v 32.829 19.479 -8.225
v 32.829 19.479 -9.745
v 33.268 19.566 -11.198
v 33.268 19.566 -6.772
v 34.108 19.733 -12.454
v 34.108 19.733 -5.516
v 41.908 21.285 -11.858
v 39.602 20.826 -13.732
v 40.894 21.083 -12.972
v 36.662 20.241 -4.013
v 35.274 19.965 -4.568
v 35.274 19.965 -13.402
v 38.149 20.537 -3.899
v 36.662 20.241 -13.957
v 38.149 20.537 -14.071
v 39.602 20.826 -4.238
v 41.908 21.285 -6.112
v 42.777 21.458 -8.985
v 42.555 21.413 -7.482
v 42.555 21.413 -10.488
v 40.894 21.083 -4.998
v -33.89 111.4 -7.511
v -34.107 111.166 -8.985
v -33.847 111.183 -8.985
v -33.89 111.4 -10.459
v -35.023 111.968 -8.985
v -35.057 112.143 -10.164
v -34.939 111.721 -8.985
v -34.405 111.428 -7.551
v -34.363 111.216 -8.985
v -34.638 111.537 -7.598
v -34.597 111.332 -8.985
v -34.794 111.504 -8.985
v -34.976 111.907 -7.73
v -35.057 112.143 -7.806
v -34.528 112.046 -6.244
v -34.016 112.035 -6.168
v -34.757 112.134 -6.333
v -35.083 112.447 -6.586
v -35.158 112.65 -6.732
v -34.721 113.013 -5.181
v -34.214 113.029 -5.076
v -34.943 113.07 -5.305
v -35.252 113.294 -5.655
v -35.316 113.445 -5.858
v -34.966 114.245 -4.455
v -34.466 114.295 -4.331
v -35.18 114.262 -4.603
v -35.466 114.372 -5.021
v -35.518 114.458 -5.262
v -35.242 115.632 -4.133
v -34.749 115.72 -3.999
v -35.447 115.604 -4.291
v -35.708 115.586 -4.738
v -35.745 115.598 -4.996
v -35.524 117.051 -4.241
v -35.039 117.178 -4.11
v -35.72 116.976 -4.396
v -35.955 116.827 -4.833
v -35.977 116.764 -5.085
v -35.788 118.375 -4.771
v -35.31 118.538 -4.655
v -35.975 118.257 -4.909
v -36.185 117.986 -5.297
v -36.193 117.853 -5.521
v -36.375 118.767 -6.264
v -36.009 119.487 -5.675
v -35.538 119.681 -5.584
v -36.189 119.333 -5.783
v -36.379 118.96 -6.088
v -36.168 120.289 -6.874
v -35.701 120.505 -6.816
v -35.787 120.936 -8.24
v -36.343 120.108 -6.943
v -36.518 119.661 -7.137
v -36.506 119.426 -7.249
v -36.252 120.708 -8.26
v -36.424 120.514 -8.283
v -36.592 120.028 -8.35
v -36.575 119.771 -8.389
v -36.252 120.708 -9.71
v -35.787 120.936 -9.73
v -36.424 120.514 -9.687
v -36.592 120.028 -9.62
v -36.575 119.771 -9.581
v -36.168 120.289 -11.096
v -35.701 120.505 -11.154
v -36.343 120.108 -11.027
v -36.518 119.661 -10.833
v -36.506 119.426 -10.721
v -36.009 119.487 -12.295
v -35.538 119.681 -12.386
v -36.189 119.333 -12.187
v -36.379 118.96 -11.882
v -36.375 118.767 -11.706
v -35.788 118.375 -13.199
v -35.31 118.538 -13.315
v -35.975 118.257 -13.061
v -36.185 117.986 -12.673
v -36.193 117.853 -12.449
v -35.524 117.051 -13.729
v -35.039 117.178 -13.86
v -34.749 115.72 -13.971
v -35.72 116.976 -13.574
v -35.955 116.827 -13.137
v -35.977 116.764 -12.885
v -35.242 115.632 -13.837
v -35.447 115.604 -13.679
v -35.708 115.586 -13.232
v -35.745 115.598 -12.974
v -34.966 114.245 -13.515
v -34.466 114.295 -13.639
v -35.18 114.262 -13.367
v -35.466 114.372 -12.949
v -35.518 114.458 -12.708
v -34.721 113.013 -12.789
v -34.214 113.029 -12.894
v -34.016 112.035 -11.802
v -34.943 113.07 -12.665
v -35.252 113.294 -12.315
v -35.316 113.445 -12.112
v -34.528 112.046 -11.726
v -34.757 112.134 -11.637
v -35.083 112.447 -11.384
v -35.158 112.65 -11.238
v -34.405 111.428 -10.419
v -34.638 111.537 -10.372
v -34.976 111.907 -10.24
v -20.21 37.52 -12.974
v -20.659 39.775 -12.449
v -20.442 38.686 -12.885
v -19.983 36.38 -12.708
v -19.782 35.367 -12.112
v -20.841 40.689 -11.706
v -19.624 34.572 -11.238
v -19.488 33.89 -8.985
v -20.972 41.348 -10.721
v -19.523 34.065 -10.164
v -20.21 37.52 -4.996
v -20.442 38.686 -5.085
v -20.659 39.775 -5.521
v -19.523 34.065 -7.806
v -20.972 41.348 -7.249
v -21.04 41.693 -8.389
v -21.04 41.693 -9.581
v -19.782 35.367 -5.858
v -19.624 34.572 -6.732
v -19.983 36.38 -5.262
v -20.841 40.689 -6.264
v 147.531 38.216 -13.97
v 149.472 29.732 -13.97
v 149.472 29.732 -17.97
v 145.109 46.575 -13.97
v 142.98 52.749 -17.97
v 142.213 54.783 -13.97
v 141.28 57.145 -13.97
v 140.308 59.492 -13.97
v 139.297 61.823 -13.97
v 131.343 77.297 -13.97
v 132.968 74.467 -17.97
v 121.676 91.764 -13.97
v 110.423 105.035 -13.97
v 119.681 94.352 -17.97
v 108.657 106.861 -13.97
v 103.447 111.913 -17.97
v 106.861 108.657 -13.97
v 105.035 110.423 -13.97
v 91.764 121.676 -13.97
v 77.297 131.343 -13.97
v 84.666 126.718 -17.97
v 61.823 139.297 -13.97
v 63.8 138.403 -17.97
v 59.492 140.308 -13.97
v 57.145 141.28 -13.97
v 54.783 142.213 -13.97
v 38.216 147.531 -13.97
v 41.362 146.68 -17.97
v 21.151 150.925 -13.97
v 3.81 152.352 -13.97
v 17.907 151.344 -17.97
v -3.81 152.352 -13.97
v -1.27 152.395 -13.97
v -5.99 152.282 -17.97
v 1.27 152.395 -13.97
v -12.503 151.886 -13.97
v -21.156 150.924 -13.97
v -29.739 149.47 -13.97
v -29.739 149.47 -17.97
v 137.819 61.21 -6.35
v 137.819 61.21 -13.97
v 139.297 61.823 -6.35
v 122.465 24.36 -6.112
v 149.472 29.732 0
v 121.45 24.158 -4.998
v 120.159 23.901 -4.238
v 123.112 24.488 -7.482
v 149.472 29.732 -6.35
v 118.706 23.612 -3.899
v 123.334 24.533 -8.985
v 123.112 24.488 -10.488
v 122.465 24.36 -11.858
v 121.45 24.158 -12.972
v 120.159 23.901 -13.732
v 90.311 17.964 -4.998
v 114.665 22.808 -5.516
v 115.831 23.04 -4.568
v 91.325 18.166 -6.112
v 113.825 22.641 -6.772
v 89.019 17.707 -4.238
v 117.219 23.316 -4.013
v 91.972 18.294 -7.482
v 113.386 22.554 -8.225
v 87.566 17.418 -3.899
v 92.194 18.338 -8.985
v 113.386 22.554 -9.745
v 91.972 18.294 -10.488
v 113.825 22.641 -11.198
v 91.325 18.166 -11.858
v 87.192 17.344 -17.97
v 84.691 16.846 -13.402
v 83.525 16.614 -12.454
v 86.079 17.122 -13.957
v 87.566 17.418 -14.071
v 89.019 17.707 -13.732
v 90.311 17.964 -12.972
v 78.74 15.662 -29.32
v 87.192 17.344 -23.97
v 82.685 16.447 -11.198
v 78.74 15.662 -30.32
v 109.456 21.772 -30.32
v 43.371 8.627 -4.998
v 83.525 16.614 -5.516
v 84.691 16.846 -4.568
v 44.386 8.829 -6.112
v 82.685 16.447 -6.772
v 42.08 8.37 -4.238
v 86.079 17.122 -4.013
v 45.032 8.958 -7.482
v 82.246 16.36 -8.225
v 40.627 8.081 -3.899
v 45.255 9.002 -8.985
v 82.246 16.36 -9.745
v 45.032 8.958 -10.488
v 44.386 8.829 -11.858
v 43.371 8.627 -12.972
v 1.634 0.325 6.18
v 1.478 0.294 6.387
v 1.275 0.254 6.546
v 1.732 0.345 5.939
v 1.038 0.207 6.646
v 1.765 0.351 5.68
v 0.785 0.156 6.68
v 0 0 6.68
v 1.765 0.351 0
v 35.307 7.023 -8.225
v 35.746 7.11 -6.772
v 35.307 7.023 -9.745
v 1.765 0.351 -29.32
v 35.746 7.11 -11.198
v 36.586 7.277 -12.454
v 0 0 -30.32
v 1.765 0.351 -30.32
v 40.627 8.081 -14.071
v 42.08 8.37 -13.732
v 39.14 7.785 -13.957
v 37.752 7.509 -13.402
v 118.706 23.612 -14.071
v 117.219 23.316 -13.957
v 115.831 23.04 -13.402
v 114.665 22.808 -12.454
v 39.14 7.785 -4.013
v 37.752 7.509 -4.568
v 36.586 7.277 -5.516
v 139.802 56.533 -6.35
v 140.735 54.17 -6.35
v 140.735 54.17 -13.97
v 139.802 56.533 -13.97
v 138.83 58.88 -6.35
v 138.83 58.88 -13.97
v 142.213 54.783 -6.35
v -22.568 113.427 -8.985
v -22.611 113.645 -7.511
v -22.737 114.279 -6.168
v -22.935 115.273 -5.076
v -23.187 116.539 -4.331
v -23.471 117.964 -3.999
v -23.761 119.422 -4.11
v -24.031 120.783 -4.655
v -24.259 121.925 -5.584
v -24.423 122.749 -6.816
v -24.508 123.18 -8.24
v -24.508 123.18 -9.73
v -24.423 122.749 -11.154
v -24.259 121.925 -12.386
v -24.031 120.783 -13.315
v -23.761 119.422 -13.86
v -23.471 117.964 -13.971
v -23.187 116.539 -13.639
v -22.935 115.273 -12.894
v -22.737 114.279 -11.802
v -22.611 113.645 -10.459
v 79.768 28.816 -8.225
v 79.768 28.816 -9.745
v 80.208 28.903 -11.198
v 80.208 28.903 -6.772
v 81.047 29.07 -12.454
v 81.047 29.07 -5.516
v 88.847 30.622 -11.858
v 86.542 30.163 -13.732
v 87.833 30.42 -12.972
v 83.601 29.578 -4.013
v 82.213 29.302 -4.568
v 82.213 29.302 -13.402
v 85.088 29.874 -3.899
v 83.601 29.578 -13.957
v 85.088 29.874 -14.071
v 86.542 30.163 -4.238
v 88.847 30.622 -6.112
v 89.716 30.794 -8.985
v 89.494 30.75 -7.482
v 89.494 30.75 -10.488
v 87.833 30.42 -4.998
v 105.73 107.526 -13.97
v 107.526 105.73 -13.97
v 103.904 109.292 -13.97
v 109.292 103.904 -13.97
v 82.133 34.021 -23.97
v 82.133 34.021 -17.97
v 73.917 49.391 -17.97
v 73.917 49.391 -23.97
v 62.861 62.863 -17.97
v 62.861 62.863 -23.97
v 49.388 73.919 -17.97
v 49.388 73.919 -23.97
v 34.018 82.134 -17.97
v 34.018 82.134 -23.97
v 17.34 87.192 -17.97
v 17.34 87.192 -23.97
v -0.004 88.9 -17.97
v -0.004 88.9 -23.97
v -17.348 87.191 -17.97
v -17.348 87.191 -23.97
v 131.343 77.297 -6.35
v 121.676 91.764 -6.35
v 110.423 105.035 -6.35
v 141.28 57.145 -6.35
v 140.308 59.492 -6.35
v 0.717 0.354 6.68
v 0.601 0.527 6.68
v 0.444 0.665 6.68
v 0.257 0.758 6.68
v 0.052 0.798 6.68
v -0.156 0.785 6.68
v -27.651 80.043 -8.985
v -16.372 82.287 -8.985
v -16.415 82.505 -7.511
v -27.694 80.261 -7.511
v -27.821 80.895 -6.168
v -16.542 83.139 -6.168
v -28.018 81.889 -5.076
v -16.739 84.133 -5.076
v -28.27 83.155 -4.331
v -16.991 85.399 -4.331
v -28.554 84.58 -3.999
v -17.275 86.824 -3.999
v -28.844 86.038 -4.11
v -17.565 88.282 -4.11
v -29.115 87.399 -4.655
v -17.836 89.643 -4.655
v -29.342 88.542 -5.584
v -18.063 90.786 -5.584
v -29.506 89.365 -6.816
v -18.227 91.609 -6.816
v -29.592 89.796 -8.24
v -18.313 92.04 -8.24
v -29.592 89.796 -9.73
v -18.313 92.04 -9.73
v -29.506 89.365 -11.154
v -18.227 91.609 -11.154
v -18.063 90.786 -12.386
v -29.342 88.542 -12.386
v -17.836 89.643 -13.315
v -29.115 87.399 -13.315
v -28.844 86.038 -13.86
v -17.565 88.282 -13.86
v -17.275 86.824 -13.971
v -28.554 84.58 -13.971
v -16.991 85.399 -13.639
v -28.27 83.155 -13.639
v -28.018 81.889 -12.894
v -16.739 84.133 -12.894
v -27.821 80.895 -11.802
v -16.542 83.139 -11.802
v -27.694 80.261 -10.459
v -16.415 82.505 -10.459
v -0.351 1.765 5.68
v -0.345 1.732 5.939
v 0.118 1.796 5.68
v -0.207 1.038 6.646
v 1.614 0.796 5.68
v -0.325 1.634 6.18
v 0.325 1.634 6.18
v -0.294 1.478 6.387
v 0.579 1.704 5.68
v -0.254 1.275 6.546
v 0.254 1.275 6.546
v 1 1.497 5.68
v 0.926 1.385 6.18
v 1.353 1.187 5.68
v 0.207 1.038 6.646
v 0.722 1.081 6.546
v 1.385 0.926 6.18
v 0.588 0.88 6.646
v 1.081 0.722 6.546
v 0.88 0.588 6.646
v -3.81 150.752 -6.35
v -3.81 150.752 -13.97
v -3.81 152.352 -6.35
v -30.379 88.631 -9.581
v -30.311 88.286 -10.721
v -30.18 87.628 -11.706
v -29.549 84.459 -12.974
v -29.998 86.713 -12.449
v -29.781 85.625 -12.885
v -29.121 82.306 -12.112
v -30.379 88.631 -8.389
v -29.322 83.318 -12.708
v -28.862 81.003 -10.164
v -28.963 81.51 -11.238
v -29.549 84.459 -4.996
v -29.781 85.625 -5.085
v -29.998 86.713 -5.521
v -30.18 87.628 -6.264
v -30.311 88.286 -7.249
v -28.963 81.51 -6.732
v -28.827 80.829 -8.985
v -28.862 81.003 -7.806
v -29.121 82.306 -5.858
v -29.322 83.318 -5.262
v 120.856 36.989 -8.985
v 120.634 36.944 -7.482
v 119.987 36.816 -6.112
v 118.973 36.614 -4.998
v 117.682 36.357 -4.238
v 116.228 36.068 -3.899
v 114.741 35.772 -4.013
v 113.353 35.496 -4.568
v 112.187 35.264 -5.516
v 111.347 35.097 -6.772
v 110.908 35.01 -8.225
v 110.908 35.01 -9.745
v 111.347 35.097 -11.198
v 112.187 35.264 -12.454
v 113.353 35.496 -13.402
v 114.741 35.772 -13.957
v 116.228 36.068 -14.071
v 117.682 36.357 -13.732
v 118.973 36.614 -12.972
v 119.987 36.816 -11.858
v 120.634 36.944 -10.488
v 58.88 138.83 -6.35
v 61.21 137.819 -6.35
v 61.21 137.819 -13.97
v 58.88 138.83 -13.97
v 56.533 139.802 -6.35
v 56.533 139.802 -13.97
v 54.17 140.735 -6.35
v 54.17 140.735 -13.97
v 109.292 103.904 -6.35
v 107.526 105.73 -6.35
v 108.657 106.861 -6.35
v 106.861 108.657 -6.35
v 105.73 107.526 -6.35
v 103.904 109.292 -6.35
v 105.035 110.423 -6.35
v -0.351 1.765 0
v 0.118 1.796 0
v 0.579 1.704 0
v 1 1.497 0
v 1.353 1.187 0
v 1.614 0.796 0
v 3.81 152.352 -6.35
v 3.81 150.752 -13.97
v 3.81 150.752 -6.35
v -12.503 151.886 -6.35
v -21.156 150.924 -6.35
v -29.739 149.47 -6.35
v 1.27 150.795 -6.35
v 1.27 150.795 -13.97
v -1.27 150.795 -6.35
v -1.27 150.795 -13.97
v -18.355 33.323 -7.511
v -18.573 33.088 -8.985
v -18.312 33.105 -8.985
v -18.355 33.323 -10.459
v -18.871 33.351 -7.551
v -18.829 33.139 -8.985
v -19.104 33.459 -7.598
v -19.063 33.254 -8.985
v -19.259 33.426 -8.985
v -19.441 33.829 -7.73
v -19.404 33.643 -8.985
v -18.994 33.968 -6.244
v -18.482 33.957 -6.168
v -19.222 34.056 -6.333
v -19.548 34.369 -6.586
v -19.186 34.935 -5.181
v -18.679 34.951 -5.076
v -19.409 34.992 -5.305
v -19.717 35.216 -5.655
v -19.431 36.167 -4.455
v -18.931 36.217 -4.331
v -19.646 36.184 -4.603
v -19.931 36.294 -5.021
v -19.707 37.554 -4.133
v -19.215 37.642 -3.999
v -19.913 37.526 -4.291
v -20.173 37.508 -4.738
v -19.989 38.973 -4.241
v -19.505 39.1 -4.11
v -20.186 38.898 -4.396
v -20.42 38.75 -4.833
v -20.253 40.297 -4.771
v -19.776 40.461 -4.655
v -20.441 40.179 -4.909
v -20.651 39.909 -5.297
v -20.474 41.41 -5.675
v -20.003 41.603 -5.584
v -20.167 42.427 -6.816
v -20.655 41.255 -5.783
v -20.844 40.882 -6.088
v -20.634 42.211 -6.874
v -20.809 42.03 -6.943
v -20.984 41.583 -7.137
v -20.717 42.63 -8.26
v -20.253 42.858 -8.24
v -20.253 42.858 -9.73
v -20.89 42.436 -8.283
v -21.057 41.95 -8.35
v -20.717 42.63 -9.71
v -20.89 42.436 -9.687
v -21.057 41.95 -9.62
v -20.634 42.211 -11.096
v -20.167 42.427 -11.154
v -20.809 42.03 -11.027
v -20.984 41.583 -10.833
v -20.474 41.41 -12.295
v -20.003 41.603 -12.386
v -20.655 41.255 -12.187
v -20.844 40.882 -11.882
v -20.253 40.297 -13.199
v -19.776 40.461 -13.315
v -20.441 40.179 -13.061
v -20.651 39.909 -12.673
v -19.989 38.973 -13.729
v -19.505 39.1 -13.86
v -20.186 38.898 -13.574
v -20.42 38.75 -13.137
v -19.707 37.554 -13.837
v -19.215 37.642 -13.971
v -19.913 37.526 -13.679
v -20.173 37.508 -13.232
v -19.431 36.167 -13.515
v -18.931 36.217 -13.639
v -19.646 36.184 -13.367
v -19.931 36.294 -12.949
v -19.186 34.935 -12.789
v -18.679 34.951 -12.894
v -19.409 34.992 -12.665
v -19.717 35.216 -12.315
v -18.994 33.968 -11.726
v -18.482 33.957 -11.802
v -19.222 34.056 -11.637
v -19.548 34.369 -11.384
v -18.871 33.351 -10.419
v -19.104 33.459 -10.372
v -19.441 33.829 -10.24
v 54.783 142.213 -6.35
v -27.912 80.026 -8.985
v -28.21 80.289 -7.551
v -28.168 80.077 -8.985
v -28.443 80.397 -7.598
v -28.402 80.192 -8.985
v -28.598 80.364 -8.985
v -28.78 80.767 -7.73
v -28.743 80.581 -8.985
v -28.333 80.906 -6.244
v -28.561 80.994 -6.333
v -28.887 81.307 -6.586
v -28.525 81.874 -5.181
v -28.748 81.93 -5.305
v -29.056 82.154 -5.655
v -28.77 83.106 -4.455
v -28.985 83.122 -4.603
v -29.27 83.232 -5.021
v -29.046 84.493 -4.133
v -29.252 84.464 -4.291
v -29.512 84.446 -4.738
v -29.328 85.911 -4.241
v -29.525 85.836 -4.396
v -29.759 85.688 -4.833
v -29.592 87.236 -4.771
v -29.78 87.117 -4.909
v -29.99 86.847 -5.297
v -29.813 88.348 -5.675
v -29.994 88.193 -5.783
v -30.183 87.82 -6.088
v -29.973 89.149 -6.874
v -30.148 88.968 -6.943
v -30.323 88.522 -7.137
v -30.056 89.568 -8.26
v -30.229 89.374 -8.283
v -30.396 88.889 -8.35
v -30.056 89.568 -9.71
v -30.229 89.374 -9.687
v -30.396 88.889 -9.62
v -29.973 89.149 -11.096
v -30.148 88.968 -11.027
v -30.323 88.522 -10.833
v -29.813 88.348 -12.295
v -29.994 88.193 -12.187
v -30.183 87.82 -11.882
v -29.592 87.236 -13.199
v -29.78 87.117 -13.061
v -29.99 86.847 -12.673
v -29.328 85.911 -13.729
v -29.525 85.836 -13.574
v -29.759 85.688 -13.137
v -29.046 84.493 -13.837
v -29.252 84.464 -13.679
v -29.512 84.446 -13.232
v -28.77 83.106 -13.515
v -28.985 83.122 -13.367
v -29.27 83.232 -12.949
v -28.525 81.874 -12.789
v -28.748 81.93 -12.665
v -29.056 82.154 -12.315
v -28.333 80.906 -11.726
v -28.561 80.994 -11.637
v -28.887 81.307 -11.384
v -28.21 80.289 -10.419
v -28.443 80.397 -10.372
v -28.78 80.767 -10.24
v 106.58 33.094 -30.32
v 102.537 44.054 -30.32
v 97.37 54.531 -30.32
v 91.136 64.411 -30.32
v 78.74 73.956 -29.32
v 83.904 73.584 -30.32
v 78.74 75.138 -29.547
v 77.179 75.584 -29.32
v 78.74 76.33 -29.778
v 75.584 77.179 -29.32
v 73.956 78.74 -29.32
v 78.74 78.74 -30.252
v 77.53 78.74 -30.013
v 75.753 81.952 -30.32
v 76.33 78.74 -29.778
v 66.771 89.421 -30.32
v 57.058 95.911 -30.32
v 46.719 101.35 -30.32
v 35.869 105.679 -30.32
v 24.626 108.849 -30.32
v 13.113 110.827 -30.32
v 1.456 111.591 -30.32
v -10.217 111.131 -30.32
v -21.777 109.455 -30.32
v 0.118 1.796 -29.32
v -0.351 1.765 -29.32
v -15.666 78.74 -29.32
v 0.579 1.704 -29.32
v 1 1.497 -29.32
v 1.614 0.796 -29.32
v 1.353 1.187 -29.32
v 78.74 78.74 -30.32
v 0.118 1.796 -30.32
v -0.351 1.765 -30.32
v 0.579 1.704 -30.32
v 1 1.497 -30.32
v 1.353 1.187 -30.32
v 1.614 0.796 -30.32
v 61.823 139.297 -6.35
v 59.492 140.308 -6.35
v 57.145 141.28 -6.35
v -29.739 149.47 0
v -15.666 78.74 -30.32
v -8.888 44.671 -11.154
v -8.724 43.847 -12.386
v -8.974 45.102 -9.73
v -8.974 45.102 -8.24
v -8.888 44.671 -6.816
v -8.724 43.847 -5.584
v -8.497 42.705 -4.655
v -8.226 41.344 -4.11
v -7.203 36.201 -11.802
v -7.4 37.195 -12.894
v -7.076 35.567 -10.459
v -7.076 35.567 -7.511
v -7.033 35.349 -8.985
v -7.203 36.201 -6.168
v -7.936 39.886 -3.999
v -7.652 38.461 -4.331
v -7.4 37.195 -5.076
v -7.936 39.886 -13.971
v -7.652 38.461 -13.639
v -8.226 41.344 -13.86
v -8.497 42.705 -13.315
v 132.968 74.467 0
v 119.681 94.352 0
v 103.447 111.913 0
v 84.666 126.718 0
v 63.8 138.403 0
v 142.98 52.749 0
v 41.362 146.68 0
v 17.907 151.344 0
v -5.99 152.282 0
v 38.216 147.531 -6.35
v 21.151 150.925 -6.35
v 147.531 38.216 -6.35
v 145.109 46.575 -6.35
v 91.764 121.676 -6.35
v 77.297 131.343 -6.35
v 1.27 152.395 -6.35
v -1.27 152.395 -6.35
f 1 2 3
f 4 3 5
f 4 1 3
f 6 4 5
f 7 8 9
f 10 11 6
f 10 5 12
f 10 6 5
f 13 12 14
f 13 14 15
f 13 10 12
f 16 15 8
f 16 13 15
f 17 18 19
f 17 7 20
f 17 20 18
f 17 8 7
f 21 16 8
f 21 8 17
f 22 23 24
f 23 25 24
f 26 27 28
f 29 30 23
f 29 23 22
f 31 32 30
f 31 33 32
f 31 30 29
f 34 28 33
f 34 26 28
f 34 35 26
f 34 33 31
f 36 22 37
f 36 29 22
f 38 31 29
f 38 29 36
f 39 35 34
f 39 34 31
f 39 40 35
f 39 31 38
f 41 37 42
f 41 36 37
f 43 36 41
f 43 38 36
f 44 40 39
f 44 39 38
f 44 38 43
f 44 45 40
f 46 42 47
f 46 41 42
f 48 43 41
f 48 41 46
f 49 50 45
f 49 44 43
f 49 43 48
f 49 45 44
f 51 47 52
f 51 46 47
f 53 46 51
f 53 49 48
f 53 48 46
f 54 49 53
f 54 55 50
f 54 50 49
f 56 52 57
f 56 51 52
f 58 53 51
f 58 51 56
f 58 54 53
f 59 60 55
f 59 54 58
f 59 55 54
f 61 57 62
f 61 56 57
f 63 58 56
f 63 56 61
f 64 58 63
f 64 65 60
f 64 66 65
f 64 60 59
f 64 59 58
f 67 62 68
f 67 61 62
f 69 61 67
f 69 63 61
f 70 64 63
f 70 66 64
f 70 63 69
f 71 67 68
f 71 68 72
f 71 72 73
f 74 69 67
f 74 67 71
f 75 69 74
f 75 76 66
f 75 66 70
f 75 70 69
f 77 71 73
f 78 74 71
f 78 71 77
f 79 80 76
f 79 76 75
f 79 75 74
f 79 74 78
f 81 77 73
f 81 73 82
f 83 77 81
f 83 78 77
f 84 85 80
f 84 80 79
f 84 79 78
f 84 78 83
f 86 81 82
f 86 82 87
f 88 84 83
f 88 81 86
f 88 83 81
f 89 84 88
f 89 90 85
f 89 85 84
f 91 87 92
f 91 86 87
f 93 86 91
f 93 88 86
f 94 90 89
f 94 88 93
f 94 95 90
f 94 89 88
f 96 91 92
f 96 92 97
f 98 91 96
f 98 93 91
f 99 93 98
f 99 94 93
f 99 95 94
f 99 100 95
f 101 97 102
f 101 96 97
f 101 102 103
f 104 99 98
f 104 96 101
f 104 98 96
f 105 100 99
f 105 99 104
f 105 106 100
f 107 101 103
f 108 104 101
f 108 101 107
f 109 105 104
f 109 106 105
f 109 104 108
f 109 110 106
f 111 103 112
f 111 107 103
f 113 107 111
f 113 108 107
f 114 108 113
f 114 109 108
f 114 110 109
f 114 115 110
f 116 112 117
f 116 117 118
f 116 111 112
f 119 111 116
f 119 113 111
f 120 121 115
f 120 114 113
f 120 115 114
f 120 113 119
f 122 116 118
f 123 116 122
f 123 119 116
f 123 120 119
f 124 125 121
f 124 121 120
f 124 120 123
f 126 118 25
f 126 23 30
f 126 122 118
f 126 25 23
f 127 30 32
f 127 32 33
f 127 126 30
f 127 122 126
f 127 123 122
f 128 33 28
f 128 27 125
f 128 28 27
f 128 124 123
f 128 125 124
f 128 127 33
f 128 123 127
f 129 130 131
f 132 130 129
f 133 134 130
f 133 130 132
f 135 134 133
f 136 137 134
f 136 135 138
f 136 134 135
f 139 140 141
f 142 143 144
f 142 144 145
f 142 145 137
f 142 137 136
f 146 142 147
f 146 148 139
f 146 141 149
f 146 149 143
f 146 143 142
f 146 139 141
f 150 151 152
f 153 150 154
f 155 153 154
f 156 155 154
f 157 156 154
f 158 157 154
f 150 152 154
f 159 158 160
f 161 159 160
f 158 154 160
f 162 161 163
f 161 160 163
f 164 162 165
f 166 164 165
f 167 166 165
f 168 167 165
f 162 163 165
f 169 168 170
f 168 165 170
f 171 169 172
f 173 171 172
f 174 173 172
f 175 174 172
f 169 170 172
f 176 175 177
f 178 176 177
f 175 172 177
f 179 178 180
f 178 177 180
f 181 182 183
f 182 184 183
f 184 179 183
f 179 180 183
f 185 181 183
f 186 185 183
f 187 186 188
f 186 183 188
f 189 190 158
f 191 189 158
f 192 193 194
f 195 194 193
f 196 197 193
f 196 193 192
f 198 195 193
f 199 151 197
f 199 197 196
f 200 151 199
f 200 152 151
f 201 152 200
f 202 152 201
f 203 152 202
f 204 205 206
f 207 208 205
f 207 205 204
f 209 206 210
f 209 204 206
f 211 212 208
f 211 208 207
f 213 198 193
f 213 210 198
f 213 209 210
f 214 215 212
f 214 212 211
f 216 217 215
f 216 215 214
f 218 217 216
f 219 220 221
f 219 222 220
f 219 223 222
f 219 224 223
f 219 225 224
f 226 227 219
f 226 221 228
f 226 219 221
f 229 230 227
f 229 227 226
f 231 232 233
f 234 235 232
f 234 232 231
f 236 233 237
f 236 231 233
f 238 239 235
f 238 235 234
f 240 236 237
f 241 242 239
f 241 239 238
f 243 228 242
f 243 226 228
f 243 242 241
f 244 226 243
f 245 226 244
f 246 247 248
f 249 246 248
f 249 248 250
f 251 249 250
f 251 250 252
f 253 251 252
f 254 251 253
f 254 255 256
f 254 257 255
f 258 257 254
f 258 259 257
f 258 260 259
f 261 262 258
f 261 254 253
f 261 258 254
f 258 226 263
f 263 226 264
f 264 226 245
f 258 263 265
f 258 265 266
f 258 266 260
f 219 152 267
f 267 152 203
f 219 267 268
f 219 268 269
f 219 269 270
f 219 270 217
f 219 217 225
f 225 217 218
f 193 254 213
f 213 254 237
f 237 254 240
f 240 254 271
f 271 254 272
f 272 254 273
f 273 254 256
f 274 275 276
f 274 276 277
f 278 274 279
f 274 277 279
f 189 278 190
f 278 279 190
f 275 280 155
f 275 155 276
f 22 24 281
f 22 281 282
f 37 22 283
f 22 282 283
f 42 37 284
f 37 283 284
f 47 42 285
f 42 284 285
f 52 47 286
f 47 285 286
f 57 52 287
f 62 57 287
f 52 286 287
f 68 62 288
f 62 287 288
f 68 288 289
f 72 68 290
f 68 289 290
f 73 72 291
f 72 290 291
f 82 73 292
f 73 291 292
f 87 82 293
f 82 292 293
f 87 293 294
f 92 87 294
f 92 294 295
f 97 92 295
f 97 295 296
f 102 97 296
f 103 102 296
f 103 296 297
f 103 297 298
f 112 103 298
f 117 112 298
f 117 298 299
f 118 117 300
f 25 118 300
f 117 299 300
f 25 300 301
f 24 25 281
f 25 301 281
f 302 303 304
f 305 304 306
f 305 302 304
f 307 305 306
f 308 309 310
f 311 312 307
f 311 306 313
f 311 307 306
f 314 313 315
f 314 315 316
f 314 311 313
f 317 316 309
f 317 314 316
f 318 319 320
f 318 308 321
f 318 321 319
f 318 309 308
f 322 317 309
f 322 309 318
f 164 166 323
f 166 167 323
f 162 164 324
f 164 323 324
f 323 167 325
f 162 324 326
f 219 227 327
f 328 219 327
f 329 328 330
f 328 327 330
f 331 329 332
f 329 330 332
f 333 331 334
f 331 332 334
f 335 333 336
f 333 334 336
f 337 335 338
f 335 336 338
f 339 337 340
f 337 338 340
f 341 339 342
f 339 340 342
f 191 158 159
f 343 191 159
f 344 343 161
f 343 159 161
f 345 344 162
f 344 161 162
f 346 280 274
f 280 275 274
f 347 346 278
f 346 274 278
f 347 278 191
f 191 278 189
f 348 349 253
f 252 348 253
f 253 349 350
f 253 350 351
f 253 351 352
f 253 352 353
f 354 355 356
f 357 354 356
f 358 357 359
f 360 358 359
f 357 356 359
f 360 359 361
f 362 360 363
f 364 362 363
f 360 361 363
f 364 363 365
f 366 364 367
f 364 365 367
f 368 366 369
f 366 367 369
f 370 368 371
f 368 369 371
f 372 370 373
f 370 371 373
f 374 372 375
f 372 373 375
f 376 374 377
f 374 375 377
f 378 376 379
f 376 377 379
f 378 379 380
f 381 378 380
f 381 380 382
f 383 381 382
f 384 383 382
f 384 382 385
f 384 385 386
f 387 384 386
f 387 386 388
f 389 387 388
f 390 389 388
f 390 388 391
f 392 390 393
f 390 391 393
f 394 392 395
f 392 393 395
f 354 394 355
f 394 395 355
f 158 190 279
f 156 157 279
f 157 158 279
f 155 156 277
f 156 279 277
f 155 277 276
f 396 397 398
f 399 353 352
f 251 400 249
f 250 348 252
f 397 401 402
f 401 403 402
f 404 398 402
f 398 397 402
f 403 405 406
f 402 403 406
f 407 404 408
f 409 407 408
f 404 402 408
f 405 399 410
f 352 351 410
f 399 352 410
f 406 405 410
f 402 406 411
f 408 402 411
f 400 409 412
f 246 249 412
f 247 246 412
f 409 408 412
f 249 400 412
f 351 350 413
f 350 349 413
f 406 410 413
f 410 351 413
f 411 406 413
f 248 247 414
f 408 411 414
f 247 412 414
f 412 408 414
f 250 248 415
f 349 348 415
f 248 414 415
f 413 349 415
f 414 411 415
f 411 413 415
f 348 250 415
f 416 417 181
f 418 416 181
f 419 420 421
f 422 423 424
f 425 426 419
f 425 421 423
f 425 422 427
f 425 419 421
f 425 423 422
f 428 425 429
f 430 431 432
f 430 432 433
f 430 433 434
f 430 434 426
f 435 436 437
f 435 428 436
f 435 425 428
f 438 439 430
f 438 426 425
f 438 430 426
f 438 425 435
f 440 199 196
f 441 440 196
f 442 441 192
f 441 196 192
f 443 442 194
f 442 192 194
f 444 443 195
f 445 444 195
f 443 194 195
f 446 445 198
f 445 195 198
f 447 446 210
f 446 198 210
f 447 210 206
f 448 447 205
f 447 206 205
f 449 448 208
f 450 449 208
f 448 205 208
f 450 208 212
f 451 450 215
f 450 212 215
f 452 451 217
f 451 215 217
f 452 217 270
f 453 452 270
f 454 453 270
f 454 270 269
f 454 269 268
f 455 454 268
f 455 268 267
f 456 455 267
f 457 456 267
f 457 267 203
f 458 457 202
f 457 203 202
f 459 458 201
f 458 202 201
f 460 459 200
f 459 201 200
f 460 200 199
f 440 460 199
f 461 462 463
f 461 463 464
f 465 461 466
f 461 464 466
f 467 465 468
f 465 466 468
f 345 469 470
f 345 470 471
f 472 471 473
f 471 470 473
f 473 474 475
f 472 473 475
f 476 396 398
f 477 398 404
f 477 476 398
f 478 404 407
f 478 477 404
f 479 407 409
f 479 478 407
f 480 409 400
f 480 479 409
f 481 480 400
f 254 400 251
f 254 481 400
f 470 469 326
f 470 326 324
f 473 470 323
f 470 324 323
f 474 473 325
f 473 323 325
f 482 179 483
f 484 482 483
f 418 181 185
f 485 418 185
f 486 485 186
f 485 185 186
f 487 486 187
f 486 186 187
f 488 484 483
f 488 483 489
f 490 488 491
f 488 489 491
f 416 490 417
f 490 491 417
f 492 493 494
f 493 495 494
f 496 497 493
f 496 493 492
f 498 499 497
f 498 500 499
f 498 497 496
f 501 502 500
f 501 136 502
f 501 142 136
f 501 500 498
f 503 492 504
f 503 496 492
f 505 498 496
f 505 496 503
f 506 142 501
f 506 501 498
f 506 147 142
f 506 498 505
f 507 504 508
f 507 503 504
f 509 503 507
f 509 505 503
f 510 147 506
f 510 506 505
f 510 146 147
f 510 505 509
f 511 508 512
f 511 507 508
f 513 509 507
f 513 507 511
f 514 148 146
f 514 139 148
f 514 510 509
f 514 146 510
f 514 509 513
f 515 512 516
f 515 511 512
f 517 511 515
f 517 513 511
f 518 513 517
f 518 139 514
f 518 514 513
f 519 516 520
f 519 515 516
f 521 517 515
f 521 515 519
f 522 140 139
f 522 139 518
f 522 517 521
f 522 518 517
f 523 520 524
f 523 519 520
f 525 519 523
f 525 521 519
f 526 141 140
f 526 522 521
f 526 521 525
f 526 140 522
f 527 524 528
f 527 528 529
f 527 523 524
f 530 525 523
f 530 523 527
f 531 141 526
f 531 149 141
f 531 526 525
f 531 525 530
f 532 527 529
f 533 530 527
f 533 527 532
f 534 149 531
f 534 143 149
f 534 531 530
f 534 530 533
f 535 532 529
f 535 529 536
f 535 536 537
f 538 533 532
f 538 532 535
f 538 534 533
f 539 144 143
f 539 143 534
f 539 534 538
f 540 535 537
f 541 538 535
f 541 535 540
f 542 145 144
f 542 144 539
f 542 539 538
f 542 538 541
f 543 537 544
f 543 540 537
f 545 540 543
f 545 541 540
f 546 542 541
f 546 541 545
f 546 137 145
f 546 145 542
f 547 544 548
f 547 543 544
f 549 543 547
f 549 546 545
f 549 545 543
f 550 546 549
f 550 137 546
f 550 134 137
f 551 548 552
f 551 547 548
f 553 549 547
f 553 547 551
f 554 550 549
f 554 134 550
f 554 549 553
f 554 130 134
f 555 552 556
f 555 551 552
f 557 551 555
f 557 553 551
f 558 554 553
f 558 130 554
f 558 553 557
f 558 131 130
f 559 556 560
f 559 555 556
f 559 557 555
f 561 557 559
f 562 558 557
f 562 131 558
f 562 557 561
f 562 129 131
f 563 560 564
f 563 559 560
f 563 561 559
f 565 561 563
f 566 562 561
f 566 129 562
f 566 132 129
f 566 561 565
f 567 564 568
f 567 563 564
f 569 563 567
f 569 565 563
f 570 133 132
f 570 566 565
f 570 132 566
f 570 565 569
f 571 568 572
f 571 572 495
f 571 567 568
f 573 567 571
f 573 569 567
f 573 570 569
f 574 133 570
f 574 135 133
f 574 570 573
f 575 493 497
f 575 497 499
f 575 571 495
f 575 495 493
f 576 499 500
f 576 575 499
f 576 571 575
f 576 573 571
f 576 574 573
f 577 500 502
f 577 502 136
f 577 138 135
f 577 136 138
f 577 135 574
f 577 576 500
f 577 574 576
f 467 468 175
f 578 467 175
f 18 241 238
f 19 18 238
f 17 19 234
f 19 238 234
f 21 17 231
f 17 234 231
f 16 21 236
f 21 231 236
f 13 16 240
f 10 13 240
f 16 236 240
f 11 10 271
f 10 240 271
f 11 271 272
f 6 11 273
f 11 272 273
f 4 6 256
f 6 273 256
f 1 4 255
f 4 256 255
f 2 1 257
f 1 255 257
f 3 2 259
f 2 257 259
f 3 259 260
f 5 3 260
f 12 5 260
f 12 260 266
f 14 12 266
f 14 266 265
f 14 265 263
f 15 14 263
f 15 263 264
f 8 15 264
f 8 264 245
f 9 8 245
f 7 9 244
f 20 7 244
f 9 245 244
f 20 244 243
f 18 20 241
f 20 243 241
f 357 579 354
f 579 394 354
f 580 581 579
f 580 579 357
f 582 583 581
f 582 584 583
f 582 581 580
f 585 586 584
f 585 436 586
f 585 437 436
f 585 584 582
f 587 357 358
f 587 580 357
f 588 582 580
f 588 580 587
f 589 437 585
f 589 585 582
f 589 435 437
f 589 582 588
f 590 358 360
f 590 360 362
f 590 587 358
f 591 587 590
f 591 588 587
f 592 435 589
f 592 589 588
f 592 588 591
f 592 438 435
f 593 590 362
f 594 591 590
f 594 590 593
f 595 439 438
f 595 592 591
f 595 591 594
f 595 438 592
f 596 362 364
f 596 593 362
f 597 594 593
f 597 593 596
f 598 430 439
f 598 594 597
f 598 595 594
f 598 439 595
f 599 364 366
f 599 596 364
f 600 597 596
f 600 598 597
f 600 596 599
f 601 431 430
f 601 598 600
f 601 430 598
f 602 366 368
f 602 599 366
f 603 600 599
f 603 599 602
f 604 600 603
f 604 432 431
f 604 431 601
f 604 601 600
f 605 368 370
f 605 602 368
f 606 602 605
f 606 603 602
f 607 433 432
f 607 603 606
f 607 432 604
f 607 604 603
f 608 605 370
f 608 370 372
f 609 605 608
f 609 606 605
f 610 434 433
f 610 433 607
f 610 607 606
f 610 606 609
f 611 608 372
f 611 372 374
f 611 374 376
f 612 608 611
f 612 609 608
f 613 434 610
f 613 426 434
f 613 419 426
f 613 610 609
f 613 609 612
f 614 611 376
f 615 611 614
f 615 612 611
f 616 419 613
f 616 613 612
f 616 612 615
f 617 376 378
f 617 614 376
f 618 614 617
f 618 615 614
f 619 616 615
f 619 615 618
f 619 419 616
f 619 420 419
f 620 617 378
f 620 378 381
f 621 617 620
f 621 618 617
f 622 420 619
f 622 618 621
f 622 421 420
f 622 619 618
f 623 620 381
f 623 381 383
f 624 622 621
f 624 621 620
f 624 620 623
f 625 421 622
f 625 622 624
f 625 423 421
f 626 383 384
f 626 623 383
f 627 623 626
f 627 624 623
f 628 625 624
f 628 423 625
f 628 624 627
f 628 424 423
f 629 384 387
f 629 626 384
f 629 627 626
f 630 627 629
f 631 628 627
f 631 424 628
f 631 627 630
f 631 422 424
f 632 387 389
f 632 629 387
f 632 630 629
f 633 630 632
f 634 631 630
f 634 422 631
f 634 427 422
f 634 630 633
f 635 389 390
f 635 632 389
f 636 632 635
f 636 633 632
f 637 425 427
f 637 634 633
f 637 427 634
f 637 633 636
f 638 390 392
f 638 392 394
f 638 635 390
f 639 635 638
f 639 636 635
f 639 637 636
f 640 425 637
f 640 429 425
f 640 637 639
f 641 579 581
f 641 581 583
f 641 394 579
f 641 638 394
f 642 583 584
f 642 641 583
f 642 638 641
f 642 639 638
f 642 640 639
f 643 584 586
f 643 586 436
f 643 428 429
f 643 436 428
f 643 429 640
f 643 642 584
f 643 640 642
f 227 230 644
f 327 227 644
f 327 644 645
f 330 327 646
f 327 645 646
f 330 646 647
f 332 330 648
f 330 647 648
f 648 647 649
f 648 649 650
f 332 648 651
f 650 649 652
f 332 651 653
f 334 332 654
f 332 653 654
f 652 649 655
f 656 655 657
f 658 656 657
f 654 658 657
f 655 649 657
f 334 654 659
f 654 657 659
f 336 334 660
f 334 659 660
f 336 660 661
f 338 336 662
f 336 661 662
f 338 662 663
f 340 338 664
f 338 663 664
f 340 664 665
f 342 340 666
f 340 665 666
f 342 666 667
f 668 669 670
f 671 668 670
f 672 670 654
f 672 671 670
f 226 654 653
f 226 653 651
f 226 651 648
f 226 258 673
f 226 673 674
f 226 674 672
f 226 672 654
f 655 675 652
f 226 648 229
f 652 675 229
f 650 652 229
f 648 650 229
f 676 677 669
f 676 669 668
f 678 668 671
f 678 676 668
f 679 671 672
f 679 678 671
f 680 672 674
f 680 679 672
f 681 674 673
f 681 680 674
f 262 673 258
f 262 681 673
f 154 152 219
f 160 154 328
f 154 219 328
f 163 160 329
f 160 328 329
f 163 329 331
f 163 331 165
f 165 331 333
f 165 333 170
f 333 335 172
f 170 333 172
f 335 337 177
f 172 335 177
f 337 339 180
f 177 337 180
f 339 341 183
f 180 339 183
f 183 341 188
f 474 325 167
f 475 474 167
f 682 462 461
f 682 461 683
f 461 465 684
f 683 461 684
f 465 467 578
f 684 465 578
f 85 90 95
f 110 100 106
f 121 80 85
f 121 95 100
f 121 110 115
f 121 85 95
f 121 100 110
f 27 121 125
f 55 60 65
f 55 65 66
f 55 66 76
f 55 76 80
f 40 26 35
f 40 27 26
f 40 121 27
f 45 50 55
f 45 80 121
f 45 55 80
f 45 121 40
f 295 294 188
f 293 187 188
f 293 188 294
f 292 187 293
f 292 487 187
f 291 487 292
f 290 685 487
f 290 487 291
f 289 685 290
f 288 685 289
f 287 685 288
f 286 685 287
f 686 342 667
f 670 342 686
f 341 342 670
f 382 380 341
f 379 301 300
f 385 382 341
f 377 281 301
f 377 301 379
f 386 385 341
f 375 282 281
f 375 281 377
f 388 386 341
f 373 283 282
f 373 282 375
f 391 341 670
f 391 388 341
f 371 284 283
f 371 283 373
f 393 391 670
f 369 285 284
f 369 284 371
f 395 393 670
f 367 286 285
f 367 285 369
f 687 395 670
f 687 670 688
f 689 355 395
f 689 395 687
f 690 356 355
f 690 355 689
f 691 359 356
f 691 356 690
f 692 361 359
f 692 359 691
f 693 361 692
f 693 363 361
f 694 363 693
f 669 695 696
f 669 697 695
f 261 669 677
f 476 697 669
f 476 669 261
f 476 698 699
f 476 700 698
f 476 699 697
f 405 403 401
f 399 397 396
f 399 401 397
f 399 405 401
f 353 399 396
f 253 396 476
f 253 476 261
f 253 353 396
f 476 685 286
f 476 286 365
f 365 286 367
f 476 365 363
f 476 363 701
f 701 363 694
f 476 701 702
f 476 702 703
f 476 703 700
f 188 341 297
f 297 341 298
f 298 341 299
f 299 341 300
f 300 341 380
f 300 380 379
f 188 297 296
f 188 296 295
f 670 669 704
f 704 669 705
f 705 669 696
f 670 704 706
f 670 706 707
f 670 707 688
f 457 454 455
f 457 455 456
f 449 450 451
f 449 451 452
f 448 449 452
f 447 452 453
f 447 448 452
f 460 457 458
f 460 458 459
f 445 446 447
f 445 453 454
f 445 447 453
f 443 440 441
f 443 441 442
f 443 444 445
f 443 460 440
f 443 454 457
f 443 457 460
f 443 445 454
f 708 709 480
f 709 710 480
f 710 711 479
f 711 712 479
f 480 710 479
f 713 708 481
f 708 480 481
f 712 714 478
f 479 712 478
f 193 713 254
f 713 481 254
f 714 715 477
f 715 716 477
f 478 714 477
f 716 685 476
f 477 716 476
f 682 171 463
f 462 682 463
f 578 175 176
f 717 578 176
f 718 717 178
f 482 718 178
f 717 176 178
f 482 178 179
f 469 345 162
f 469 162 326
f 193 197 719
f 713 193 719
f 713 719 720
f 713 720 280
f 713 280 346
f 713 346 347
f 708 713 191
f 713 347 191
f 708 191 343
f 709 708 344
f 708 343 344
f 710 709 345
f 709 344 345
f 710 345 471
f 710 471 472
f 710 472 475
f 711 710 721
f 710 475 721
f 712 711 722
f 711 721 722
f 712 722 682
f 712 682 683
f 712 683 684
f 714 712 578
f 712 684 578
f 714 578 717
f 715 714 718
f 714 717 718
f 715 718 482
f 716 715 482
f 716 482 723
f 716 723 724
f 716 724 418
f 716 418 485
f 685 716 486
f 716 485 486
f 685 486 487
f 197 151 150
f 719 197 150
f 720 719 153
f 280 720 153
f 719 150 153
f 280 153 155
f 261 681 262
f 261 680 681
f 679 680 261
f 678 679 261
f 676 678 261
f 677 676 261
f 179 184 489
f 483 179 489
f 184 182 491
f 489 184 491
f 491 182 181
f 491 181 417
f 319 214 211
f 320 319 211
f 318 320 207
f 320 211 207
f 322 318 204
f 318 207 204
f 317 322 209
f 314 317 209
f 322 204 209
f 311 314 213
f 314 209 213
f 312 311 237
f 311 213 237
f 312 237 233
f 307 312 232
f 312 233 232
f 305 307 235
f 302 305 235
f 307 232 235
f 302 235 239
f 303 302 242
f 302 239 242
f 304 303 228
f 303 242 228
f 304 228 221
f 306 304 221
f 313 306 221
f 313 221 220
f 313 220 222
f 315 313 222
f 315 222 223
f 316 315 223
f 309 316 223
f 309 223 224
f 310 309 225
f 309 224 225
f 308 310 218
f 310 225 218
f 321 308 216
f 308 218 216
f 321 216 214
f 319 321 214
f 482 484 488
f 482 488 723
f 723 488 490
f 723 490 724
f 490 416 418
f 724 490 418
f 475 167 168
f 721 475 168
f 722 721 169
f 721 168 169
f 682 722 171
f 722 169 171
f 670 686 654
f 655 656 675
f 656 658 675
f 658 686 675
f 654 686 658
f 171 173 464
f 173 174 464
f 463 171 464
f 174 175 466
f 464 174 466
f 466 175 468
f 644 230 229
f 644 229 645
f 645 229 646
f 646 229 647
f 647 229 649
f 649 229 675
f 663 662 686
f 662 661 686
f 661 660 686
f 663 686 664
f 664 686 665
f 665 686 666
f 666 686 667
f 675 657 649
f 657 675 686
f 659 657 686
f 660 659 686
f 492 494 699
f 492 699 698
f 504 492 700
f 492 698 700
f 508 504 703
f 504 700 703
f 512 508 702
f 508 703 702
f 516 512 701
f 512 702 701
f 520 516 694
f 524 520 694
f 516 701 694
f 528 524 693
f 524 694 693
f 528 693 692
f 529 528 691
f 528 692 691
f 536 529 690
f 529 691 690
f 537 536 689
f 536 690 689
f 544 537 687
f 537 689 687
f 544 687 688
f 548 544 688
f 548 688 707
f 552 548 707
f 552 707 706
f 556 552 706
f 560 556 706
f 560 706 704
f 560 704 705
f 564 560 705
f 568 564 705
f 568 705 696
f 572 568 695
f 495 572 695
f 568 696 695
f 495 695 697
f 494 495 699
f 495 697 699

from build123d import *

# Parameters (mm, degrees)
BOSS_EXTRUDE1_START = -13.97
BOSS_EXTRUDE1_DEPTH = 7.62
SKETCH3_W           = 157.48
SKETCH3_H           = 157.48
CUT_EXTRUDE1_DEPTH  = 1
SKETCH3_3_R         = 1.8
BOSS_EXTRUDE2_DEPTH = 37
FILLET1_R           = 1
SKETCH11_R          = 5.1
CUT_EXTRUDE2_DEPTH  = 12.7
SKETCH10_R          = 5
BOSS_EXTRUDE3_DEPTH = 12.5
FILLET2_R           = 1


# Read off the part's stored shape, not the designer's step: Boss-Extrude1
with BuildPart() as part:
    # Sketch1 → Revolve1 (revolve)
    with BuildSketch(Plane.YZ, mode=Mode.PRIVATE) as revolve1_sk:
        Polygon((0, 0), (-152.4, 0), (-152.4, -6.35), (-150.8, -6.35), (-150.8, -13.97), (-152.4, -13.97), (-152.4, -17.97), (-88.9, -17.97), (-88.9, -23.97), (-111.6, -30.32), (0, -30.32), align=None)
    revolve(revolve1_sk.sketch.rotate(Axis((0, 0, -30.32), (0, 0, 1)), 180), axis=Axis((0, 0, -30.32), (0, 0, 1)))

    # Boss-Extrude1 outline → Boss-Extrude1 (add)
    with BuildSketch(Plane.XY.offset(BOSS_EXTRUDE1_START)):
        with BuildLine():
            Line((150.751862012, 3.81), (152.352367556, 3.81))
            ThreePointArc((152.352367556, 3.81), (149.471676733, 29.731765076), (142.213257992, 54.782745927))
            Line((142.213257992, 54.782745927), (140.734583678, 54.170258971))
            ThreePointArc((140.734583678, 54.170258971), (147.902420285, 29.41962056), (150.751862012, 3.81))
        make_face()
        with BuildLine():
            ThreePointArc((142.213257992, -54.782745926), (149.471676733, -29.731765075), (152.352367556, -3.81))
            Line((152.352367556, -3.81), (150.751862012, -3.81))
            ThreePointArc((150.751862012, -3.81), (147.902420285, -29.41962056), (140.734583678, -54.170258971))
            Line((140.734583678, -54.170258971), (142.213257992, -54.782745926))
        make_face()
        with BuildLine():
            Line((137.818535923, 61.210221009), (139.297210238, 61.822707964))
            ThreePointArc((139.297210238, 61.822707964), (126.715968915, 84.668903512), (110.423469065, 105.035315393))
            Line((110.423469065, 105.035315393), (109.291740741, 103.903587069))
            ThreePointArc((109.291740741, 103.903587069), (125.385617535, 83.77999114), (137.818535923, 61.210221009))
        make_face()
        with BuildLine():
            ThreePointArc((110.423469065, -105.035315392), (126.715968915, -84.668903512), (139.297210238, -61.822707964))
            Line((139.297210238, -61.822707964), (137.818535923, -61.210221009))
            ThreePointArc((137.818535923, -61.210221009), (125.385617535, -83.77999114), (109.291740741, -103.903587069))
            Line((109.291740741, -103.903587069), (110.423469065, -105.035315392))
        make_face()
        with BuildLine():
            Line((103.903587069, 109.291740741), (105.035315393, 110.423469065))
            ThreePointArc((105.035315393, 110.423469065), (84.668903512, 126.715968915), (61.822707964, 139.297210238))
            Line((61.822707964, 139.297210238), (61.210221009, 137.818535923))
            ThreePointArc((61.210221009, 137.818535923), (83.77999114, 125.385617535), (103.903587069, 109.291740741))
        make_face()
        with BuildLine():
            ThreePointArc((61.822707964, -139.297210238), (84.668903512, -126.715968915), (105.035315393, -110.423469065))
            Line((105.035315393, -110.423469065), (103.903587069, -109.291740741))
            ThreePointArc((103.903587069, -109.291740741), (83.77999114, -125.385617535), (61.210221009, -137.818535923))
            Line((61.210221009, -137.818535923), (61.822707964, -139.297210238))
        make_face()
        with BuildLine():
            Line((54.170258971, 140.734583678), (54.782745927, 142.213257992))
            ThreePointArc((54.782745927, 142.213257992), (29.731765076, 149.471676733), (3.81, 152.352367556))
            Line((3.81, 152.352367556), (3.81, 150.751862012))
            ThreePointArc((3.81, 150.751862012), (29.41962056, 147.902420285), (54.170258971, 140.734583678))
        make_face()
        with BuildLine():
            ThreePointArc((3.81, -152.352367556), (29.731765076, -149.471676733), (54.782745927, -142.213257992))
            Line((54.782745927, -142.213257992), (54.170258971, -140.734583678))
            ThreePointArc((54.170258971, -140.734583678), (29.41962056, -147.902420285), (3.81, -150.751862012))
            Line((3.81, -150.751862012), (3.81, -152.352367556))
        make_face()
        with BuildLine():
            Line((-3.81, 150.751862012), (-3.81, 152.352367556))
            ThreePointArc((-3.81, 152.352367556), (-29.731765076, 149.471676733), (-54.782745927, 142.213257992))
            Line((-54.782745927, 142.213257992), (-54.170258971, 140.734583678))
            ThreePointArc((-54.170258971, 140.734583678), (-29.41962056, 147.902420285), (-3.81, 150.751862012))
        make_face()
        with BuildLine():
            ThreePointArc((-54.782745926, -142.213257992), (-29.731765075, -149.471676733), (-3.81, -152.352367556))
            Line((-3.81, -152.352367556), (-3.81, -150.751862012))
            ThreePointArc((-3.81, -150.751862012), (-29.41962056, -147.902420285), (-54.170258971, -140.734583678))
            Line((-54.170258971, -140.734583678), (-54.782745926, -142.213257992))
        make_face()
        with BuildLine():
            Line((-61.210221009, 137.818535923), (-61.822707964, 139.297210238))
            ThreePointArc((-61.822707964, 139.297210238), (-84.668903512, 126.715968915), (-105.035315393, 110.423469065))
            Line((-105.035315393, 110.423469065), (-103.903587069, 109.291740741))
            ThreePointArc((-103.903587069, 109.291740741), (-83.77999114, 125.385617535), (-61.210221009, 137.818535923))
        make_face()
        with BuildLine():
            ThreePointArc((-105.035315392, -110.423469065), (-84.668903512, -126.715968915), (-61.822707964, -139.297210238))
            Line((-61.822707964, -139.297210238), (-61.210221009, -137.818535923))
            ThreePointArc((-61.210221009, -137.818535923), (-83.77999114, -125.385617535), (-103.903587069, -109.291740741))
            Line((-103.903587069, -109.291740741), (-105.035315392, -110.423469065))
        make_face()
        with BuildLine():
            Line((-109.291740741, 103.903587069), (-110.423469065, 105.035315393))
            ThreePointArc((-110.423469065, 105.035315393), (-126.715968915, 84.668903512), (-139.297210238, 61.822707964))
            Line((-139.297210238, 61.822707964), (-137.818535923, 61.210221009))
            ThreePointArc((-137.818535923, 61.210221009), (-125.385617535, 83.77999114), (-109.291740741, 103.903587069))
        make_face()
        with BuildLine():
            ThreePointArc((-139.297210238, -61.822707964), (-126.715968915, -84.668903512), (-110.423469065, -105.035315393))
            Line((-110.423469065, -105.035315393), (-109.291740741, -103.903587069))
            ThreePointArc((-109.291740741, -103.903587069), (-125.385617535, -83.77999114), (-137.818535923, -61.210221009))
            Line((-137.818535923, -61.210221009), (-139.297210238, -61.822707964))
        make_face()
        with BuildLine():
            Line((-140.734583678, 54.170258971), (-142.213257992, 54.782745926))
            ThreePointArc((-142.213257992, 54.782745926), (-149.471676733, 29.731765075), (-152.352367556, 3.81))
            Line((-152.352367556, 3.81), (-150.751862012, 3.81))
            ThreePointArc((-150.751862012, 3.81), (-147.902420285, 29.41962056), (-140.734583678, 54.170258971))
        make_face()
        with BuildLine():
            ThreePointArc((-152.352367556, -3.81), (-149.471676733, -29.731765076), (-142.213257992, -54.782745927))
            Line((-142.213257992, -54.782745927), (-140.734583678, -54.170258971))
            ThreePointArc((-140.734583678, -54.170258971), (-147.902420285, -29.41962056), (-150.751862012, -3.81))
            Line((-150.751862012, -3.81), (-152.352367556, -3.81))
        make_face()
    extrude(amount=BOSS_EXTRUDE1_DEPTH)

    # Sketch3 → Cut-Extrude1 (cut)
    with BuildSketch(Plane(origin=(0, 0, -30.32), x_dir=(1, 0, 0), z_dir=(0, 0, -1))):
        Rectangle(SKETCH3_W, SKETCH3_H)
    extrude(amount=-CUT_EXTRUDE1_DEPTH, mode=Mode.SUBTRACT)

    # Sketch3<3> → Boss-Extrude2 (add)
    with BuildSketch(Plane(origin=(0, 0, -30.32), x_dir=(1, 0, 0), z_dir=(0, 0, -1))):
        with Locations(Location((0, 0, 0), (0, 0, 180))):
            Circle(SKETCH3_3_R)
    extrude(amount=-BOSS_EXTRUDE2_DEPTH)

    # Fillet1
    fillet1_edges = [part.edges().sort_by_distance(p)[0] for p in [
        (1.8, 0, 6.68),
    ]]
    fillet(fillet1_edges, radius=FILLET1_R)

    # Split2
    split(bisect_by=Plane(origin=(0, 0, 0), x_dir=(-0.9807852804032318, -0.19509032201612173, 0), z_dir=(0.19509032201612173, -0.9807852804032318, 0)), keep=Keep.BOTTOM)

    # Split3
    split(bisect_by=Plane(origin=(0, 0, 0), x_dir=(0.1951383847238072, -0.9807757189120169, 0), z_dir=(-0.9807757189120169, -0.1951383847238072, 0)), keep=Keep.BOTTOM)

    # Sketch11 → Cut-Extrude2 (cut)
    with BuildSketch(Plane(origin=(0, 0, 0), x_dir=(0.9807852804032318, 0.19509032201612175, 0), z_dir=(0.19509032201612175, -0.9807852804032318, 0))):
        with Locations((88.9, -8.985)):
            Circle(SKETCH11_R)
        with Locations((120.65, -8.985)):
            Circle(SKETCH11_R)
        with Locations((41.041303899, -8.985)):
            Circle(SKETCH11_R)
    extrude(amount=-CUT_EXTRUDE2_DEPTH, mode=Mode.SUBTRACT)

    # Sketch10 → Boss-Extrude3 (add)
    with BuildSketch(Plane(origin=(0, 0, 0), x_dir=(0.19513838472380637, -0.980775718912017, 0), z_dir=(-0.980775718912017, -0.19513838472380637, 0))):
        with Locations((-120.65, -8.985)):
            Circle(SKETCH10_R)
        with Locations((-88.9, -8.985)):
            Circle(SKETCH10_R)
        with Locations((-41.041695232, -8.985)):
            Circle(SKETCH10_R)
    extrude(amount=BOSS_EXTRUDE3_DEPTH)

    # Fillet2
    fillet2_edges = [part.edges().sort_by_distance(p)[0] for p in [
        (-36.778834527, 120.795239272, -8.985),
        (-30.583190812, 89.655610197, -8.985),
        (-21.244198524, 42.717346933, -8.985),
    ]]
    fillet(fillet2_edges, radius=FILLET2_R)


solid = part.part
